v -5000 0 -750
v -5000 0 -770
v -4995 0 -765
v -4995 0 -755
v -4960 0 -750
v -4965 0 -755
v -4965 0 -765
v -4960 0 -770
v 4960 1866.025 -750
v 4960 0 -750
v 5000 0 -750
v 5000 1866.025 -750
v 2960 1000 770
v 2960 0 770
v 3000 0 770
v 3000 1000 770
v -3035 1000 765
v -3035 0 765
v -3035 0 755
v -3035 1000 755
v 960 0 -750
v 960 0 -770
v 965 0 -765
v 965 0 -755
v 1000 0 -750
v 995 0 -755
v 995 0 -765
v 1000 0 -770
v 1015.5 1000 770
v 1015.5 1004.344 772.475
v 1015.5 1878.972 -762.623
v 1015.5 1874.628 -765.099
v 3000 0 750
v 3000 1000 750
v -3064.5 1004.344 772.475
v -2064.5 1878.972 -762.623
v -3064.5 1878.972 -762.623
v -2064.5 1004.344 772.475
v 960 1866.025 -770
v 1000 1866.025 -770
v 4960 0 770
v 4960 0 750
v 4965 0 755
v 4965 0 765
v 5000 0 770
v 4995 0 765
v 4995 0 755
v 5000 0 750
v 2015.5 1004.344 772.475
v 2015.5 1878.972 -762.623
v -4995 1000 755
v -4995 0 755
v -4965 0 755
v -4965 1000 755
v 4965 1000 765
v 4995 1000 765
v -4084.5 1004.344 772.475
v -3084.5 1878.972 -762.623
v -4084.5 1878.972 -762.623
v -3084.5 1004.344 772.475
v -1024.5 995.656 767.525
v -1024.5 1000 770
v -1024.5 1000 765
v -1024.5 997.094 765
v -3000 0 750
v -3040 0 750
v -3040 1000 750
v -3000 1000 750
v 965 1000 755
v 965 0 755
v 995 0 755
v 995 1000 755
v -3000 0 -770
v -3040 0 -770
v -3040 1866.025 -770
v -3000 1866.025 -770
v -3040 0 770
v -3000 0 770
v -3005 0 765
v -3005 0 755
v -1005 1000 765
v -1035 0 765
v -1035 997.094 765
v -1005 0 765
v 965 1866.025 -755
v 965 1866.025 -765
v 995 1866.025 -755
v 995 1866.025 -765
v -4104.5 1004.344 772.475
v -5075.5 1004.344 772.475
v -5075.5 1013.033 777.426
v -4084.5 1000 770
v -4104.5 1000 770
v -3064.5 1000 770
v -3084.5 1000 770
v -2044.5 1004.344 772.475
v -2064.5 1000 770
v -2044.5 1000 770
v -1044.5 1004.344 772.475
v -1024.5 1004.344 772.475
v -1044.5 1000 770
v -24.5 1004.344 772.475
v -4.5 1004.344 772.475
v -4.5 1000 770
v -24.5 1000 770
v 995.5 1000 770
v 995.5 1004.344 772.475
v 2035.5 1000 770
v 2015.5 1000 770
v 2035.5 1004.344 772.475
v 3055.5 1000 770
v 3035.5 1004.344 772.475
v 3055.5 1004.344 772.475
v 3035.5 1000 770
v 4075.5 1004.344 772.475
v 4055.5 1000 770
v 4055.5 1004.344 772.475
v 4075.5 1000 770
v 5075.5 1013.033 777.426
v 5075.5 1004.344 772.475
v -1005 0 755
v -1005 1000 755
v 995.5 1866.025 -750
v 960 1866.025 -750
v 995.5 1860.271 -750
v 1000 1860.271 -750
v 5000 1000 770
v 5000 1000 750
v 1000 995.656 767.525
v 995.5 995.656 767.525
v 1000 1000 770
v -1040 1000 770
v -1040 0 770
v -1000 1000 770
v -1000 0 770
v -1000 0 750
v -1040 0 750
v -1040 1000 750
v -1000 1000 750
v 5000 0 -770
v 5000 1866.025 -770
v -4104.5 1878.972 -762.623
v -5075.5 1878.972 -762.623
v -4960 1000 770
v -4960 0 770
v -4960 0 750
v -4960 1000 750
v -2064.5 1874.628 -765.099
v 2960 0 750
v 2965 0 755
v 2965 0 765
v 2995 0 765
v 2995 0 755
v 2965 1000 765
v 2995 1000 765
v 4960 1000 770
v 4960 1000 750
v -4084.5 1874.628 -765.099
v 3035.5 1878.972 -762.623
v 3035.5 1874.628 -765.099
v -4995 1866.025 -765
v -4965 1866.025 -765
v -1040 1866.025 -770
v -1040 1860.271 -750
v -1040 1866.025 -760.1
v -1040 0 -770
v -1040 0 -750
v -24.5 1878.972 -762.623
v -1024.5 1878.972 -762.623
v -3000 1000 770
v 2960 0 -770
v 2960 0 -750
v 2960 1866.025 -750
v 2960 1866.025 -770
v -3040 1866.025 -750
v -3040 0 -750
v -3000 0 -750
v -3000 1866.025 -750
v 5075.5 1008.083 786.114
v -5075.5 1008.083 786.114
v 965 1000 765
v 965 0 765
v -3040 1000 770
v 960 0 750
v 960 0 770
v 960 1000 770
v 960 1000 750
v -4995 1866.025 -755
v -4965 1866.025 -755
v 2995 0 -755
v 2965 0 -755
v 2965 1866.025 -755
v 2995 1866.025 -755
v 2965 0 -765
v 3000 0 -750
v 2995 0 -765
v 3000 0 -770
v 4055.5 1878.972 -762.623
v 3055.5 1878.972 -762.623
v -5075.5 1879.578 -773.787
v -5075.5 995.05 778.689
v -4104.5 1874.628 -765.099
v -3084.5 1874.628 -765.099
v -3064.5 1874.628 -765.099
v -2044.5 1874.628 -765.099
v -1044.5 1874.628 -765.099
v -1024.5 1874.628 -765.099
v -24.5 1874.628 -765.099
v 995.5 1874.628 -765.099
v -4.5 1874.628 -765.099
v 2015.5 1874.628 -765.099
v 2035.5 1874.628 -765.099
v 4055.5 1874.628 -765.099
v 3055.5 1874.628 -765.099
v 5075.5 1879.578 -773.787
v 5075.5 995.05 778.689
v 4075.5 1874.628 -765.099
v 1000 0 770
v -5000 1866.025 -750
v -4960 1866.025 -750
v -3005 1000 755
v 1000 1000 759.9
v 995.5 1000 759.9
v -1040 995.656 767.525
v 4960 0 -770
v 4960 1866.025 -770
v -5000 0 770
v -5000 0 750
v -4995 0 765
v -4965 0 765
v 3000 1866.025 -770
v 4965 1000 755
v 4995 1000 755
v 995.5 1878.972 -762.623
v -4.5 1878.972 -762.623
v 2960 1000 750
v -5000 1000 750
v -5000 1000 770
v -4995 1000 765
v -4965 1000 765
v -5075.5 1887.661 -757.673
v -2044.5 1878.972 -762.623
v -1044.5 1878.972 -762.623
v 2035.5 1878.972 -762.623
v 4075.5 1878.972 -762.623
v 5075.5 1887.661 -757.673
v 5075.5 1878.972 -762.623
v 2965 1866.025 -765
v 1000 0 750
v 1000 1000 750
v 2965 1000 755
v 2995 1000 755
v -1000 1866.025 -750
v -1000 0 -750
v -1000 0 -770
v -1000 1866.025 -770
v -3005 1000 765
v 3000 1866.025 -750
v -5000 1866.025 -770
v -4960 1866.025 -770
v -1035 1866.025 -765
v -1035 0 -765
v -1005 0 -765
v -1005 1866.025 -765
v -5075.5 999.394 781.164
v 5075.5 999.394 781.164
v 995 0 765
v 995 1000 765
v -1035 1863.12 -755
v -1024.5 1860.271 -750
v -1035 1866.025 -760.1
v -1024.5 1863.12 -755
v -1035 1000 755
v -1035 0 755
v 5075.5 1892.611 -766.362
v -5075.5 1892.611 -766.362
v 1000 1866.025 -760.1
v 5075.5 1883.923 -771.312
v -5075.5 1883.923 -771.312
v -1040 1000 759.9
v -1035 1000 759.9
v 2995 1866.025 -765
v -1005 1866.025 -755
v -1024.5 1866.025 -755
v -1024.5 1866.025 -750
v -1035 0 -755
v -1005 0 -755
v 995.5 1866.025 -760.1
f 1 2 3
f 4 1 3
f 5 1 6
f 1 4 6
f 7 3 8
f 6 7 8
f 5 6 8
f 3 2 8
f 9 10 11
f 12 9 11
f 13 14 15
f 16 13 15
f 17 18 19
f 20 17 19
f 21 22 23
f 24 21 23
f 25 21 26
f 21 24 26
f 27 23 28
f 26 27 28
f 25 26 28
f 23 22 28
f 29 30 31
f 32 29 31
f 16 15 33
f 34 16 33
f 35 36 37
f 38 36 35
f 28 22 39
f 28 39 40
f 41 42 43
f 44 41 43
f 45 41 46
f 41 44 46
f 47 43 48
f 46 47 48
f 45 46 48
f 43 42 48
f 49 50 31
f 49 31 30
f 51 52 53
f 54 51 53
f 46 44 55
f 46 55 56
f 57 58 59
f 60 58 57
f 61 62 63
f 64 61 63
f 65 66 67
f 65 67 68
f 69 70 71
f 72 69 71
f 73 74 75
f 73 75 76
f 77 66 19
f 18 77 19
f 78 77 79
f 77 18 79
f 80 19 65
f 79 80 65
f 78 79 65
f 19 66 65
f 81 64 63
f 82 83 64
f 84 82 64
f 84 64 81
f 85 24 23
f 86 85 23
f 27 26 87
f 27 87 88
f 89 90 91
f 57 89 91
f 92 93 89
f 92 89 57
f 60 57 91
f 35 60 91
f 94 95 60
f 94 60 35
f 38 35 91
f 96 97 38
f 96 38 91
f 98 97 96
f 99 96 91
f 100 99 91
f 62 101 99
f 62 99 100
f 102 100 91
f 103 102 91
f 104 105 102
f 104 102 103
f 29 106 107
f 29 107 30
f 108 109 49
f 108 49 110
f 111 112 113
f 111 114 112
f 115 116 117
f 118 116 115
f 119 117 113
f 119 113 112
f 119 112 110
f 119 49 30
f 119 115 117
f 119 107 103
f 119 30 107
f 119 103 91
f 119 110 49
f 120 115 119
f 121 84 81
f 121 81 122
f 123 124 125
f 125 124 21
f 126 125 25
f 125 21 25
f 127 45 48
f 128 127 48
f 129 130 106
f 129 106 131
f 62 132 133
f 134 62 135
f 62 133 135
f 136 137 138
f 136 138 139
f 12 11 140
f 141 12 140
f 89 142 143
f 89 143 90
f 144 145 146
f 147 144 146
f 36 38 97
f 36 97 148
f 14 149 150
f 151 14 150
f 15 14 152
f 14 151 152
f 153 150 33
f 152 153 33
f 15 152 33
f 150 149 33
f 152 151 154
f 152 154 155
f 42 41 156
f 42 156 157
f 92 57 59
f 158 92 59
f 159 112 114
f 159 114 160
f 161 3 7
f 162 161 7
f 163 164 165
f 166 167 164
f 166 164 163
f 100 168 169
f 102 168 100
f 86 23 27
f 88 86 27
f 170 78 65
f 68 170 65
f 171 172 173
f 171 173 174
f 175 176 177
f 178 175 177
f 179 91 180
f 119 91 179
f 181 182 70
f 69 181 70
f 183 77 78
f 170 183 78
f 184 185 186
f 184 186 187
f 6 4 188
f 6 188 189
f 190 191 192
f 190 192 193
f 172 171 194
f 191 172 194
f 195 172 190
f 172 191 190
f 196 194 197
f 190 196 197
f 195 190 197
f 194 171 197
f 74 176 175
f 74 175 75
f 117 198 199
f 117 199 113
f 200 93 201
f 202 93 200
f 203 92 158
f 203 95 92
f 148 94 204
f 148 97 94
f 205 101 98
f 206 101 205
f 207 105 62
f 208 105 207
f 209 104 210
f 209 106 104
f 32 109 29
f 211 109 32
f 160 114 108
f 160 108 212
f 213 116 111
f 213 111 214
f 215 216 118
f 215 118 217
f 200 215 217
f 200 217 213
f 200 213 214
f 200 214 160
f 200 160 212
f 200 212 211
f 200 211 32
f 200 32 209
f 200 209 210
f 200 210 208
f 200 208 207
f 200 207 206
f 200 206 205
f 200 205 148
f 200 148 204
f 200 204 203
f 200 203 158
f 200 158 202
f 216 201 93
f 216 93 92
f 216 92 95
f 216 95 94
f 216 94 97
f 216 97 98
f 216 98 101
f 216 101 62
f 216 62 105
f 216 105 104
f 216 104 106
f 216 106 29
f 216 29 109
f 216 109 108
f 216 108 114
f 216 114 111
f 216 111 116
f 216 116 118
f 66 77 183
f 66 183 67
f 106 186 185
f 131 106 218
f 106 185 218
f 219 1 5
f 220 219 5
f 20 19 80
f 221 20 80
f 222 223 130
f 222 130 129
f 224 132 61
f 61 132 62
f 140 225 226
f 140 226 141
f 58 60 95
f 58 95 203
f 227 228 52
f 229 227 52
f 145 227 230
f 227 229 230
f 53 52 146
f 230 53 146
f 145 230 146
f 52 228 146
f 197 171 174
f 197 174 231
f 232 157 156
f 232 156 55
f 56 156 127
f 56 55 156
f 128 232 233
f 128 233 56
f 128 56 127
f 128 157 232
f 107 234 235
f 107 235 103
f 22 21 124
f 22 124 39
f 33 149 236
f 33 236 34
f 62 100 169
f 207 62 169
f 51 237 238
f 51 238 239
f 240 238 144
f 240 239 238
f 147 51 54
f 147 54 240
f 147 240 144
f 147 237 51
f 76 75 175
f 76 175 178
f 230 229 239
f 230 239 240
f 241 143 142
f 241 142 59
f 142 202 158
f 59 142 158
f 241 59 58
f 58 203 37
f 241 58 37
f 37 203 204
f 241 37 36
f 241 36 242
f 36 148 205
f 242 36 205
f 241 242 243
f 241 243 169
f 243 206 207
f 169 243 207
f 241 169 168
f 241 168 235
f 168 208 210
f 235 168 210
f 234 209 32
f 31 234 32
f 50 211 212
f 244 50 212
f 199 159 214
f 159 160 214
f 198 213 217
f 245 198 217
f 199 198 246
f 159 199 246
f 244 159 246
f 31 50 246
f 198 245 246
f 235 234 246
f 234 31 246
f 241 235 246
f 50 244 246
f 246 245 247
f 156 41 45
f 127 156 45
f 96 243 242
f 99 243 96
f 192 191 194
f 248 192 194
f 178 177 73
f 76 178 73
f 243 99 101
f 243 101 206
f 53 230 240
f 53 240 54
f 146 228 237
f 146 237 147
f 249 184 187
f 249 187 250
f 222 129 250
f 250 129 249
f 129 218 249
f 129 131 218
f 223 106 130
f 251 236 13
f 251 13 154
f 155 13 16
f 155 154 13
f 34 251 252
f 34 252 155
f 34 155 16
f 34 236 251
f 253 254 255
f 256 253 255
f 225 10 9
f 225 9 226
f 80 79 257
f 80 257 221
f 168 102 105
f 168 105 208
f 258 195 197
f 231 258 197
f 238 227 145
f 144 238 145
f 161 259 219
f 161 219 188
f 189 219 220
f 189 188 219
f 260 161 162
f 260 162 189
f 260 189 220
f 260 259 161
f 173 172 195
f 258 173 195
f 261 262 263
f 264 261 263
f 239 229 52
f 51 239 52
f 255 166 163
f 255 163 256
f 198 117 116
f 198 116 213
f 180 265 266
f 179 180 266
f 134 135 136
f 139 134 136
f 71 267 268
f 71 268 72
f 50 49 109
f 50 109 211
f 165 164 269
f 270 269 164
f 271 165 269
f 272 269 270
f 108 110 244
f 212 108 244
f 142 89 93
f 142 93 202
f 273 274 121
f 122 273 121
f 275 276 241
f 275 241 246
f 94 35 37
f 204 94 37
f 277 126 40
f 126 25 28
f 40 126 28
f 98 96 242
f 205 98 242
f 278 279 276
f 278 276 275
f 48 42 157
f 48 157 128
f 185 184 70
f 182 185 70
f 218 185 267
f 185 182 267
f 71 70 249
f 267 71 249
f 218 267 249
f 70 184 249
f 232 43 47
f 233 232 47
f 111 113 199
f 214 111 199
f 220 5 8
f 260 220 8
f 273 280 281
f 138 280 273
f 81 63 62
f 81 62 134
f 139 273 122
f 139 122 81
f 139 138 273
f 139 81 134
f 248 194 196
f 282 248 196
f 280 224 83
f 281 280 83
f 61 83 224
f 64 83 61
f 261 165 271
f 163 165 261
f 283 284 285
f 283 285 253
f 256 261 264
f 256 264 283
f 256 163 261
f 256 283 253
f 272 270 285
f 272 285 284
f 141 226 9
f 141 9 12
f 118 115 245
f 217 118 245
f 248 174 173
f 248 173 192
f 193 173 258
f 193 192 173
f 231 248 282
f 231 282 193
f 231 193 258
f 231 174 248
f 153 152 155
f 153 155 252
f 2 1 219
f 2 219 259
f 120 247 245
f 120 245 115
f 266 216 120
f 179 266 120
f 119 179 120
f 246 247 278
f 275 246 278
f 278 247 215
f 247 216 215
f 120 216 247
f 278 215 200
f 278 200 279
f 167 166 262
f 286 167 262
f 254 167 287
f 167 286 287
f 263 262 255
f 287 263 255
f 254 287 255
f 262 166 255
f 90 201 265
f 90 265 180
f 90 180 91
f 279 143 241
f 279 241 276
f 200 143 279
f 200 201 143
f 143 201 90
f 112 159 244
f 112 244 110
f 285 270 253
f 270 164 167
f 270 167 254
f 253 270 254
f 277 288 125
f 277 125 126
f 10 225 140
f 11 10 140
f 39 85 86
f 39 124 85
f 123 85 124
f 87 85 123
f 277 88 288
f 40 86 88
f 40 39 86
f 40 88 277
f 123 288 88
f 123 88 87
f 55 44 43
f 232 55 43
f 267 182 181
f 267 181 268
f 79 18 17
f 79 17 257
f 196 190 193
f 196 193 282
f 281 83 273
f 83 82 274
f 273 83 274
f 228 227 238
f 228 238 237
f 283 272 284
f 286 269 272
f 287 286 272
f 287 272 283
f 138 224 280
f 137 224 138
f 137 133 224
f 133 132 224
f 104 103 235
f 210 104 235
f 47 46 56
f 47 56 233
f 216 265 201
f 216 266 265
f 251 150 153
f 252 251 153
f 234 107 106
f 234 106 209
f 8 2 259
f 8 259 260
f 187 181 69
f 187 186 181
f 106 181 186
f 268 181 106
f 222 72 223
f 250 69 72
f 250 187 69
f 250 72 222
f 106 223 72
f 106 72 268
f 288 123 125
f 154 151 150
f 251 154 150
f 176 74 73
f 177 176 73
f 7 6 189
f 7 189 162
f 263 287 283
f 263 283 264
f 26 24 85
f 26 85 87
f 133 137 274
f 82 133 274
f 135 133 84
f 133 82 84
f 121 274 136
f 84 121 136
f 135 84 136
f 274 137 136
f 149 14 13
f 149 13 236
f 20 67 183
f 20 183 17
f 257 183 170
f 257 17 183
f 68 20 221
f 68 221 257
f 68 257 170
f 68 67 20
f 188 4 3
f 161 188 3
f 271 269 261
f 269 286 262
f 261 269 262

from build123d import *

# Parameters (mm, degrees)
SKETCH1_W              = 40
SKETCH1_H              = 20
SKETCH1_W_2            = 30
SKETCH1_H_2            = 10
BOSS_EXTRUDE1_DEPTH    = 1000
BOSS_EXTRUDE1_2_DEPTH  = 1000
BOSS_EXTRUDE1_3_DEPTH  = 1000
BOSS_EXTRUDE1_4_DEPTH  = 1000
BOSS_EXTRUDE1_5_DEPTH  = 1000
BOSS_EXTRUDE1_6_DEPTH  = 1000
BOSS_EXTRUDE1_7_DEPTH  = 1000
BOSS_EXTRUDE1_8_DEPTH  = 1000
BOSS_EXTRUDE1_9_DEPTH  = 1000
BOSS_EXTRUDE1_10_DEPTH = 1000
BOSS_EXTRUDE1_11_DEPTH = 1000
BOSS_EXTRUDE1_12_DEPTH = 1000
SKETCH1_2_W            = 40
SKETCH1_2_H            = 20
SKETCH1_2_W_2          = 30
SKETCH1_2_H_2          = 10
BOSS_EXTRUDE2_DEPTH    = 1866.025404
BOSS_EXTRUDE3_DEPTH    = 5075.5
SKETCH5_W              = 10
SKETCH5_H              = 1766.777284662
CUT_EXTRUDE1_DEPTH     = 10
SKETCH7_W              = 10151
SKETCH7_H              = 10
BOSS_EXTRUDE4_DEPTH    = 10


with BuildPart() as part:
    # Sketch1 → Boss-Extrude1 (new body)
    with BuildSketch(Plane(origin=(0, 0, 0), x_dir=(1, 0, 0), z_dir=(0, 1, 0))):
        with Locations((4980, 760)):
            Rectangle(SKETCH1_W, SKETCH1_H)
        with Locations((4980, 760)):
            Rectangle(SKETCH1_W_2, SKETCH1_H_2, mode=Mode.SUBTRACT)
    extrude(amount=BOSS_EXTRUDE1_DEPTH)



with BuildPart() as body_2:
    # Sketch1 → Boss-Extrude1 2 (new body)
    with BuildSketch(Plane(origin=(0, 0, 0), x_dir=(1, 0, 0), z_dir=(0, 1, 0))):
        with Locations((4980, -760)):
            Rectangle(SKETCH1_W, SKETCH1_H)
        with Locations((4980, -760)):
            Rectangle(SKETCH1_W_2, SKETCH1_H_2, mode=Mode.SUBTRACT)
    extrude(amount=BOSS_EXTRUDE1_2_DEPTH)


with BuildPart() as body_3:
    # Sketch1 → Boss-Extrude1 3 (new body)
    with BuildSketch(Plane(origin=(0, 0, 0), x_dir=(1, 0, 0), z_dir=(0, 1, 0))):
        with Locations((-4980, -760)):
            Rectangle(SKETCH1_W, SKETCH1_H)
        with Locations((-4980, -760)):
            Rectangle(SKETCH1_W_2, SKETCH1_H_2, mode=Mode.SUBTRACT)
    extrude(amount=BOSS_EXTRUDE1_3_DEPTH)


with BuildPart() as body_4:
    # Sketch1 → Boss-Extrude1 4 (new body)
    with BuildSketch(Plane(origin=(0, 0, 0), x_dir=(1, 0, 0), z_dir=(0, 1, 0))):
        with Locations((-4980, 760)):
            Rectangle(SKETCH1_W, SKETCH1_H)
        with Locations((-4980, 760)):
            Rectangle(SKETCH1_W_2, SKETCH1_H_2, mode=Mode.SUBTRACT)
    extrude(amount=BOSS_EXTRUDE1_4_DEPTH)


with BuildPart() as body_5:
    # Sketch1 → Boss-Extrude1 5 (new body)
    with BuildSketch(Plane(origin=(0, 0, 0), x_dir=(1, 0, 0), z_dir=(0, 1, 0))):
        with Locations((2980, 760)):
            Rectangle(SKETCH1_W, SKETCH1_H)
        with Locations((2980, 760)):
            Rectangle(SKETCH1_W_2, SKETCH1_H_2, mode=Mode.SUBTRACT)
    extrude(amount=BOSS_EXTRUDE1_5_DEPTH)


with BuildPart() as body_6:
    # Sketch1 → Boss-Extrude1 6 (new body)
    with BuildSketch(Plane(origin=(0, 0, 0), x_dir=(1, 0, 0), z_dir=(0, 1, 0))):
        with Locations((2980, -760)):
            Rectangle(SKETCH1_W, SKETCH1_H)
        with Locations((2980, -760)):
            Rectangle(SKETCH1_W_2, SKETCH1_H_2, mode=Mode.SUBTRACT)
    extrude(amount=BOSS_EXTRUDE1_6_DEPTH)


with BuildPart() as body_7:
    # Sketch1 → Boss-Extrude1 7 (new body)
    with BuildSketch(Plane(origin=(0, 0, 0), x_dir=(1, 0, 0), z_dir=(0, 1, 0))):
        with Locations((980, 760)):
            Rectangle(SKETCH1_W, SKETCH1_H)
        with Locations((980, 760)):
            Rectangle(SKETCH1_W_2, SKETCH1_H_2, mode=Mode.SUBTRACT)
    extrude(amount=BOSS_EXTRUDE1_7_DEPTH)


with BuildPart() as body_8:
    # Sketch1 → Boss-Extrude1 8 (new body)
    with BuildSketch(Plane(origin=(0, 0, 0), x_dir=(1, 0, 0), z_dir=(0, 1, 0))):
        with Locations((980, -760)):
            Rectangle(SKETCH1_W, SKETCH1_H)
        with Locations((980, -760)):
            Rectangle(SKETCH1_W_2, SKETCH1_H_2, mode=Mode.SUBTRACT)
    extrude(amount=BOSS_EXTRUDE1_8_DEPTH)


with BuildPart() as body_9:
    # Sketch1 → Boss-Extrude1 9 (new body)
    with BuildSketch(Plane(origin=(0, 0, 0), x_dir=(1, 0, 0), z_dir=(0, 1, 0))):
        with Locations((-1020, 760)):
            Rectangle(SKETCH1_W, SKETCH1_H)
        with Locations((-1020, 760)):
            Rectangle(SKETCH1_W_2, SKETCH1_H_2, mode=Mode.SUBTRACT)
    extrude(amount=BOSS_EXTRUDE1_9_DEPTH)


with BuildPart() as body_10:
    # Sketch1 → Boss-Extrude1 10 (new body)
    with BuildSketch(Plane(origin=(0, 0, 0), x_dir=(1, 0, 0), z_dir=(0, 1, 0))):
        with Locations((-1020, -760)):
            Rectangle(SKETCH1_W, SKETCH1_H)
        with Locations((-1020, -760)):
            Rectangle(SKETCH1_W_2, SKETCH1_H_2, mode=Mode.SUBTRACT)
    extrude(amount=BOSS_EXTRUDE1_10_DEPTH)


with BuildPart() as body_11:
    # Sketch1 → Boss-Extrude1 11 (new body)
    with BuildSketch(Plane(origin=(0, 0, 0), x_dir=(1, 0, 0), z_dir=(0, 1, 0))):
        with Locations((-3020, 760)):
            Rectangle(SKETCH1_W, SKETCH1_H)
        with Locations((-3020, 760)):
            Rectangle(SKETCH1_W_2, SKETCH1_H_2, mode=Mode.SUBTRACT)
    extrude(amount=BOSS_EXTRUDE1_11_DEPTH)


with BuildPart() as body_12:
    # Sketch1 → Boss-Extrude1 12 (new body)
    with BuildSketch(Plane(origin=(0, 0, 0), x_dir=(1, 0, 0), z_dir=(0, 1, 0))):
        with Locations((-3020, -760)):
            Rectangle(SKETCH1_W, SKETCH1_H)
        with Locations((-3020, -760)):
            Rectangle(SKETCH1_W_2, SKETCH1_H_2, mode=Mode.SUBTRACT)
    extrude(amount=BOSS_EXTRUDE1_12_DEPTH)


with BuildPart() as part_1:
    add(part.part)

    add(body_4.part)  # Boss-Extrude2 merges body 4

    add(body_5.part)  # Boss-Extrude2 merges body 5

    add(body_7.part)  # Boss-Extrude2 merges body 7

    add(body_9.part)  # Boss-Extrude2 merges body 9

    add(body_11.part)  # Boss-Extrude2 merges body 11
    # Sketch1<2> → Boss-Extrude2 (add)
    # profile 1 of 6: a face of its own
    with BuildSketch(Plane(origin=(0, 0, 0), x_dir=(1, 0, 0), z_dir=(0, 1, 0))):
        with Locations((-4980, 760)):
            Rectangle(SKETCH1_2_W, SKETCH1_2_H)
        with Locations((-4980, 760)):
            Rectangle(SKETCH1_2_W_2, SKETCH1_2_H_2, mode=Mode.SUBTRACT)
    # profile 2 of 6: a face of its own
    with BuildSketch(Plane(origin=(0, 0, 0), x_dir=(1, 0, 0), z_dir=(0, 1, 0))):
        with Locations((-1020, 760)):
            Rectangle(SKETCH1_2_W, SKETCH1_2_H)
        with Locations((-1020, 760)):
            Rectangle(SKETCH1_2_W_2, SKETCH1_2_H_2, mode=Mode.SUBTRACT)
    # profile 3 of 6: a face of its own
    with BuildSketch(Plane(origin=(0, 0, 0), x_dir=(1, 0, 0), z_dir=(0, 1, 0))):
        with Locations((980, 760)):
            Rectangle(SKETCH1_2_W, SKETCH1_2_H)
        with Locations((980, 760)):
            Rectangle(SKETCH1_2_W_2, SKETCH1_2_H_2, mode=Mode.SUBTRACT)
    # profile 4 of 6: a face of its own
    with BuildSketch(Plane(origin=(0, 0, 0), x_dir=(1, 0, 0), z_dir=(0, 1, 0))):
        with Locations((2980, 760)):
            Rectangle(SKETCH1_2_W, SKETCH1_2_H)
        with Locations((2980, 760)):
            Rectangle(SKETCH1_2_W_2, SKETCH1_2_H_2, mode=Mode.SUBTRACT)
    # profile 5 of 6: a face of its own
    with BuildSketch(Plane(origin=(0, 0, 0), x_dir=(1, 0, 0), z_dir=(0, 1, 0))):
        with Locations((4980, 760)):
            Rectangle(SKETCH1_2_W, SKETCH1_2_H)
    # profile 6 of 6: a face of its own
    with BuildSketch(Plane(origin=(0, 0, 0), x_dir=(1, 0, 0), z_dir=(0, 1, 0))):
        with Locations((-3020, 760)):
            Rectangle(SKETCH1_2_W, SKETCH1_2_H)
    extrude(amount=BOSS_EXTRUDE2_DEPTH)


with BuildPart() as body_8_2:
    # Sketch4 → Boss-Extrude3 (new, symmetric)
    with BuildSketch(Plane(origin=(0, 0, 0), x_dir=(0, 0, -1), z_dir=(1, 0, 0))):
        Polygon((-778.688693777, 995.049585831), (773.787373688, 1879.57834451), (771.312166604, 1883.922691399), (-781.163900862, 999.39393272), align=None)
    extrude(amount=BOSS_EXTRUDE3_DEPTH, both=True)


with BuildPart() as cut_extrude1_tool:
    # Sketch5 → Cut-Extrude1 (new body)
    with BuildSketch(Plane(origin=(0, 1090.475614889, 621.302358356), x_dir=(1, 0, 0), z_dir=(0, 0.8688693777295536, 0.4950414168974737))):
        with Locations((4070.5, 709.400638377)):
            Rectangle(SKETCH5_W, SKETCH5_H)
        with Locations((4060.5, 709.400638377)):
            Rectangle(SKETCH5_W, SKETCH5_H)
        with Locations((3040.5, 709.400638377)):
            Rectangle(SKETCH5_W, SKETCH5_H)
        with Locations((3050.5, 709.400638377)):
            Rectangle(SKETCH5_W, SKETCH5_H)
        with Locations((2020.5, 709.400638377)):
            Rectangle(SKETCH5_W, SKETCH5_H)
        with Locations((2030.5, 709.400638377)):
            Rectangle(SKETCH5_W, SKETCH5_H)
        with Locations((1000.5, 709.400638377)):
            Rectangle(SKETCH5_W, SKETCH5_H)
        with Locations((1010.5, 709.400638377)):
            Rectangle(SKETCH5_W, SKETCH5_H)
        with Locations((-19.5, 709.400638377)):
            Rectangle(SKETCH5_W, SKETCH5_H)
        with Locations((-9.5, 709.400638377)):
            Rectangle(SKETCH5_W, SKETCH5_H)
        with Locations((-1039.5, 709.400638377)):
            Rectangle(SKETCH5_W, SKETCH5_H)
        with Locations((-1029.5, 709.400638377)):
            Rectangle(SKETCH5_W, SKETCH5_H)
        with Locations((-2059.5, 709.400638377)):
            Rectangle(SKETCH5_W, SKETCH5_H)
        with Locations((-2049.5, 709.400638377)):
            Rectangle(SKETCH5_W, SKETCH5_H)
        with Locations((-3079.5, 709.400638377)):
            Rectangle(SKETCH5_W, SKETCH5_H)
        with Locations((-3069.5, 709.400638377)):
            Rectangle(SKETCH5_W, SKETCH5_H)
        with Locations((-4099.5, 709.400638377)):
            Rectangle(SKETCH5_W, SKETCH5_H)
        with Locations((-4089.5, 709.400638377)):
            Rectangle(SKETCH5_W, SKETCH5_H)
        with Locations((-5119.5, 709.400638377)):
            Rectangle(SKETCH5_W, SKETCH5_H)
        with Locations((-5109.5, 709.400638377)):
            Rectangle(SKETCH5_W, SKETCH5_H)
    extrude(amount=-CUT_EXTRUDE1_DEPTH)


with BuildPart() as part_2:
    add(part_1.part)

    # Cut-Extrude1: cut by cut_extrude1_tool
    add(cut_extrude1_tool.part, mode=Mode.SUBTRACT)


with BuildPart() as body_8_1:
    add(body_8.part)

    # Cut-Extrude1: cut by cut_extrude1_tool
    add(cut_extrude1_tool.part, mode=Mode.SUBTRACT)


with BuildPart() as body_10_1:
    add(body_10.part)

    # Cut-Extrude1: cut by cut_extrude1_tool
    add(cut_extrude1_tool.part, mode=Mode.SUBTRACT)


with BuildPart() as body_8_2_1:
    add(body_8_2.part)

    # Cut-Extrude1: cut by cut_extrude1_tool
    add(cut_extrude1_tool.part, mode=Mode.SUBTRACT)

    # Sketch7 → Boss-Extrude4 (add)
    with BuildSketch(Plane(origin=(0, 1090.475614889, 621.302358356), x_dir=(1, 0, 0), z_dir=(0, 0.8688693777295536, 0.4950414168974737))):
        with Locations((0, 1597.789280708)):
            Rectangle(SKETCH7_W, SKETCH7_H)
        with Locations((0, -178.988003954)):
            Rectangle(SKETCH7_W, SKETCH7_H)
    extrude(amount=BOSS_EXTRUDE4_DEPTH)


solid = Compound([body_2.part, body_3.part, body_6.part, body_12.part, part_2.part, body_8_1.part, body_10_1.part, body_8_2_1.part])
